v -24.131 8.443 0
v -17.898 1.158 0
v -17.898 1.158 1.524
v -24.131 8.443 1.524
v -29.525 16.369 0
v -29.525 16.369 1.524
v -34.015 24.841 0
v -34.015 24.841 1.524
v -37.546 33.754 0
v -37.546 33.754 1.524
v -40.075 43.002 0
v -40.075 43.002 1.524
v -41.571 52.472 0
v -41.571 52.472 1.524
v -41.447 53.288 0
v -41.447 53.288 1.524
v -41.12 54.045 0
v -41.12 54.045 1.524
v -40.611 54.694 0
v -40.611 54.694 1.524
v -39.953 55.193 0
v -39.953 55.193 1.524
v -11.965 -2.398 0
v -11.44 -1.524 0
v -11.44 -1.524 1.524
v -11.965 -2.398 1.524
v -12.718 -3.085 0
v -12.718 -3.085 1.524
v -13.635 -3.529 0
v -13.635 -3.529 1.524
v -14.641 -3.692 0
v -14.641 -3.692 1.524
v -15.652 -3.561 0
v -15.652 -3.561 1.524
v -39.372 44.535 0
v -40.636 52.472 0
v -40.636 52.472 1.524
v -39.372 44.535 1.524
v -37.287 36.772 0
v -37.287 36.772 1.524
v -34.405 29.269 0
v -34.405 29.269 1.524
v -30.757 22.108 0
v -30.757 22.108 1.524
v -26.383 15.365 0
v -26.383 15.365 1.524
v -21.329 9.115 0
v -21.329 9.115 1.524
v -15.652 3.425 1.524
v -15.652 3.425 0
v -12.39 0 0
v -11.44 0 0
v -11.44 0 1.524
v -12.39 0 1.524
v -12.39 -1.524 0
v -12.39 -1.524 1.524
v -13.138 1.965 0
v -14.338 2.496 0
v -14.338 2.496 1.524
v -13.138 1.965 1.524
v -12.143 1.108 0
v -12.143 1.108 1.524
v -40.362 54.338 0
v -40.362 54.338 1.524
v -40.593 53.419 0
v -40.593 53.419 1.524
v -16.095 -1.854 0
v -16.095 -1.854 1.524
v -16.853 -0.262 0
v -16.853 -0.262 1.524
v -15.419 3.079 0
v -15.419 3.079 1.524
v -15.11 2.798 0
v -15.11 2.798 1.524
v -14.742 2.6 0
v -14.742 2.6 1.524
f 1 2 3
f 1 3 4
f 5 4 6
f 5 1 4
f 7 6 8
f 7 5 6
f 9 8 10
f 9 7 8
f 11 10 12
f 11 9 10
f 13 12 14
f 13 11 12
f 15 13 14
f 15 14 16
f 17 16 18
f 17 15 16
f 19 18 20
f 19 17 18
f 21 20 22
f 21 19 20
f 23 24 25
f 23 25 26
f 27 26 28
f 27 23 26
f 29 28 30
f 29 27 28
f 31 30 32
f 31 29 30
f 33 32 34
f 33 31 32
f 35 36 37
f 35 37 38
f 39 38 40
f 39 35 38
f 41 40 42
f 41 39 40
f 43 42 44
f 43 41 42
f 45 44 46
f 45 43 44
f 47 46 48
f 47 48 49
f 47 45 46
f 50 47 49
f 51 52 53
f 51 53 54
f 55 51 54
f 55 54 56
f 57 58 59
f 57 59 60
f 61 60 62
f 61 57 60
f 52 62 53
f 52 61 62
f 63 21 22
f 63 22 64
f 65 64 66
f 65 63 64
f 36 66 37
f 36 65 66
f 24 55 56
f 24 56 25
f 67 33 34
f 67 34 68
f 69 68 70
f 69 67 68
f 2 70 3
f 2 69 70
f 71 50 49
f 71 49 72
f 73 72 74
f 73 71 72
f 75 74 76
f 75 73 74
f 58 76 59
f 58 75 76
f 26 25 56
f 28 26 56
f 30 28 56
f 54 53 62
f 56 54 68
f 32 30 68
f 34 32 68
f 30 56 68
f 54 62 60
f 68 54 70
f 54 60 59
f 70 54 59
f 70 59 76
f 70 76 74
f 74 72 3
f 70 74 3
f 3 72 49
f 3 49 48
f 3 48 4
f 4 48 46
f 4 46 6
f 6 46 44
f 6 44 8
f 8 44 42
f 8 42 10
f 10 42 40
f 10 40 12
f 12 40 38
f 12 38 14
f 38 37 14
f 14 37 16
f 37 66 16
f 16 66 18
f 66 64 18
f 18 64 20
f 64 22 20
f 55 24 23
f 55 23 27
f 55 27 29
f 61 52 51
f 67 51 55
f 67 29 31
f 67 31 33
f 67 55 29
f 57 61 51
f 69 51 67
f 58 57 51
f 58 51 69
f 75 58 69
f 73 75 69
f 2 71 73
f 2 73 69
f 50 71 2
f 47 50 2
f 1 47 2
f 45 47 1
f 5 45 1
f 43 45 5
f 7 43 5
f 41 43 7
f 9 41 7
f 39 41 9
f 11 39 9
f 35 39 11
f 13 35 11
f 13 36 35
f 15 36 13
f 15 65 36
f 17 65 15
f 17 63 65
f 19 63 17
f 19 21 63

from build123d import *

# Parameters (mm, degrees)
BOSS_EXTRUDE1_DEPTH = 1.524


with BuildPart() as part:
    # Sketch1 → Boss-Extrude1 (new body)
    with BuildSketch(Plane.XY):
        with BuildLine():
            Line((-12.390496283, 0), (-12.390496283, -1.524))
            Line((-12.390496283, -1.524), (-11.440495099, -1.524))
            ThreePointArc((-11.440495099, -1.524), (-13.160567298, -3.340075702), (-15.652172906, -3.560713016))
            ThreePointArc((-15.652172906, -3.560713016), (-16.43578107, -1.039818757), (-17.898233983, 1.157948542))
            ThreePointArc((-17.898233983, 1.157948542), (-34.014860834, 24.840522989), (-41.571298491, 52.472212106))
            ThreePointArc((-41.571298491, 52.472212106), (-41.120011165, 54.045320934), (-39.952895072, 55.192566182))
            ThreePointArc((-39.952895072, 55.192566182), (-40.500139361, 53.88401522), (-40.636498822, 52.472212106))
            ThreePointArc((-40.636498822, 52.472212106), (-32.67469804, 25.640883384), (-15.652172906, 3.425030694))
            ThreePointArc((-15.652172906, 3.425030694), (-15.109824899, 2.798358256), (-14.338010517, 2.496427364))
            ThreePointArc((-14.338010517, 2.496427364), (-12.609091081, 1.573387542), (-11.440495099, 0))
            Line((-11.440495099, 0), (-12.390496283, 0))
        make_face()
    extrude(amount=BOSS_EXTRUDE1_DEPTH)


solid = part.part
